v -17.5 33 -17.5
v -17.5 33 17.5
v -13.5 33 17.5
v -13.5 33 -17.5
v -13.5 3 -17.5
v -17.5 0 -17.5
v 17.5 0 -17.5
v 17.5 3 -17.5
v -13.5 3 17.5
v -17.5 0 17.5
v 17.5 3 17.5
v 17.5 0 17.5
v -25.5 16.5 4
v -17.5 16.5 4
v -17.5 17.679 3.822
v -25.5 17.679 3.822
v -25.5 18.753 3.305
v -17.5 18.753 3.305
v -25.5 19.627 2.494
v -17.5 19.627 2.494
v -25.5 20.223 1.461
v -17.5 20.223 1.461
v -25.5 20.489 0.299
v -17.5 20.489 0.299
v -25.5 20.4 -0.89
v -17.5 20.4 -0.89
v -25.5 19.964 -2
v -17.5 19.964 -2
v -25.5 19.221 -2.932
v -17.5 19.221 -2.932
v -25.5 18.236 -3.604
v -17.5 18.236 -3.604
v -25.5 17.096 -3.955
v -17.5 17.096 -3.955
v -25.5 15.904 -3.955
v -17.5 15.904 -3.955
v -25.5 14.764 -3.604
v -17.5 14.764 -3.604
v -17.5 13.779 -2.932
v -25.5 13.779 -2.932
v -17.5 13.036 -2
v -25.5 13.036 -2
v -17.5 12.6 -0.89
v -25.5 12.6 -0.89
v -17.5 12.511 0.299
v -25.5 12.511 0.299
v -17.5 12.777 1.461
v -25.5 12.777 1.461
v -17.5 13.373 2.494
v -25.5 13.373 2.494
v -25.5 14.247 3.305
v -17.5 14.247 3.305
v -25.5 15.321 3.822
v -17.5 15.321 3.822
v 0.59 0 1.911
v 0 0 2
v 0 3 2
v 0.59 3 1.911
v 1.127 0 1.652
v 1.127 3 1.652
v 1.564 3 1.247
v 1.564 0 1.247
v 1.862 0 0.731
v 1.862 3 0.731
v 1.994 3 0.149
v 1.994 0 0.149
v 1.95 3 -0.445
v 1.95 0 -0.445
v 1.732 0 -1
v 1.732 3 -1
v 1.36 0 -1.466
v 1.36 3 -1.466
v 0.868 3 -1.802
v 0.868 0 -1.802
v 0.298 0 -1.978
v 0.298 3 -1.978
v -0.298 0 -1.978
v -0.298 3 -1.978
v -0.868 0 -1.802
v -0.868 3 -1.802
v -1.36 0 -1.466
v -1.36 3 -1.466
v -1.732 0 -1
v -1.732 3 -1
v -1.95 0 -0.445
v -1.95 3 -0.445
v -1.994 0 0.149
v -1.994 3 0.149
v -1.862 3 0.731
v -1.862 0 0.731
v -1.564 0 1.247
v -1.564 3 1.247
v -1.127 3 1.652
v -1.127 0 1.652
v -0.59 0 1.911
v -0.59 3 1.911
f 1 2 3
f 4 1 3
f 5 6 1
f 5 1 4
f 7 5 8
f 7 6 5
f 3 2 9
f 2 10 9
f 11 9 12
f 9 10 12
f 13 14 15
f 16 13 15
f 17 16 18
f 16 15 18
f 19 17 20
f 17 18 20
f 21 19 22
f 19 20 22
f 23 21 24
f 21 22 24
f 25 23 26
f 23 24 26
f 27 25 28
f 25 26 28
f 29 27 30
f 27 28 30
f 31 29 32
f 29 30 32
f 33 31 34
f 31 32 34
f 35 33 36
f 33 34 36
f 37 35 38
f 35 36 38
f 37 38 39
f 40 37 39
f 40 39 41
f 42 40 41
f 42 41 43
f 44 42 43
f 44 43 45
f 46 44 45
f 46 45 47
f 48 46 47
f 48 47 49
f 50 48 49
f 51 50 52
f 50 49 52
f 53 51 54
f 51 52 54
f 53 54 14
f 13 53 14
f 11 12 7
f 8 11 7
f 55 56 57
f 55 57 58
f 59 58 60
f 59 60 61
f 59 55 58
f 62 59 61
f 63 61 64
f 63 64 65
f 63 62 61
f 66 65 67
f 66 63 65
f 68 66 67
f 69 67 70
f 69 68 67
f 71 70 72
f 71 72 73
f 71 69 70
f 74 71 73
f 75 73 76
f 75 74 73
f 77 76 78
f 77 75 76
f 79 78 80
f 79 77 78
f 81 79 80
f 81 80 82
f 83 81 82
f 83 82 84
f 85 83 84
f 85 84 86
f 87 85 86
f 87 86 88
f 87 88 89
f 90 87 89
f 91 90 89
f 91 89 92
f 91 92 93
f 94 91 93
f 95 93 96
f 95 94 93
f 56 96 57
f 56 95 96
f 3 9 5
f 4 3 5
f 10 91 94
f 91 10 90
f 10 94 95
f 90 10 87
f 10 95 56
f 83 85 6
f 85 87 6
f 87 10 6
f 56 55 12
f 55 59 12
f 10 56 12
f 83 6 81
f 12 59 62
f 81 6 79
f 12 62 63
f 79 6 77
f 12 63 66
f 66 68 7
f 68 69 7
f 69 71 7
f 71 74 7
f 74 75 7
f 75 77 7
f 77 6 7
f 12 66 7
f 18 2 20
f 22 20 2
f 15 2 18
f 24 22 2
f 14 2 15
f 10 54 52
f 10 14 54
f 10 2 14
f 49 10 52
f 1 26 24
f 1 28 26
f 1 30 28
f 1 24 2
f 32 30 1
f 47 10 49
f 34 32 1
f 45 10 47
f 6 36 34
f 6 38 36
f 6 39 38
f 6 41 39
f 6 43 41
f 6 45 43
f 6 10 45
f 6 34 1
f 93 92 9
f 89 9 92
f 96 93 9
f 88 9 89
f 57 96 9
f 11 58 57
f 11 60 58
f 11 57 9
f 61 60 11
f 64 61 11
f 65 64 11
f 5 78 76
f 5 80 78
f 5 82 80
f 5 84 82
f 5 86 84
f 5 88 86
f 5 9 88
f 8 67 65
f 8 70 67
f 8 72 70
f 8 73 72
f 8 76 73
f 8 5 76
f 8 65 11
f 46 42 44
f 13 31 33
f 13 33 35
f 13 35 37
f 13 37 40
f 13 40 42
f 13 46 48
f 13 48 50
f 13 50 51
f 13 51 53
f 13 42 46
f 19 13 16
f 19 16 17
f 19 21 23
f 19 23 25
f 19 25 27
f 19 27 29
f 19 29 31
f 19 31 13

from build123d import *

# Parameters (mm, degrees)
SKETCH1_W           = 35
SKETCH1_H           = 35
SKETCH1_R           = 2
BOSS_EXTRUDE1_DEPTH = 3
SKETCH2_W           = 4
SKETCH2_H           = 35
BOSS_EXTRUDE2_DEPTH = 30
SKETCH3_R           = 4
BOSS_EXTRUDE3_DEPTH = 8


with BuildPart() as part:
    # Sketch1 → Boss-Extrude1 (new body)
    with BuildSketch(Plane(origin=(0, 0, 0), x_dir=(1, 0, 0), z_dir=(0, 1, 0))):
        Rectangle(SKETCH1_W, SKETCH1_H)
        with Locations(Location((0, 0, 0), (0, 0, 270))):
            Circle(SKETCH1_R, mode=Mode.SUBTRACT)
    extrude(amount=BOSS_EXTRUDE1_DEPTH)

    # Sketch2 → Boss-Extrude2 (add)
    with BuildSketch(Plane(origin=(0, 3, 0), x_dir=(1, 0, 0), z_dir=(0, 1, 0))):
        with Locations((-15.5, 0)):
            Rectangle(SKETCH2_W, SKETCH2_H)
    extrude(amount=BOSS_EXTRUDE2_DEPTH)

    # Sketch3 → Boss-Extrude3 (add)
    with BuildSketch(Plane.ZY.offset(17.5)):
        with Locations((0, 16.5)):
            Circle(SKETCH3_R)
    extrude(amount=BOSS_EXTRUDE3_DEPTH)


solid = part.part
